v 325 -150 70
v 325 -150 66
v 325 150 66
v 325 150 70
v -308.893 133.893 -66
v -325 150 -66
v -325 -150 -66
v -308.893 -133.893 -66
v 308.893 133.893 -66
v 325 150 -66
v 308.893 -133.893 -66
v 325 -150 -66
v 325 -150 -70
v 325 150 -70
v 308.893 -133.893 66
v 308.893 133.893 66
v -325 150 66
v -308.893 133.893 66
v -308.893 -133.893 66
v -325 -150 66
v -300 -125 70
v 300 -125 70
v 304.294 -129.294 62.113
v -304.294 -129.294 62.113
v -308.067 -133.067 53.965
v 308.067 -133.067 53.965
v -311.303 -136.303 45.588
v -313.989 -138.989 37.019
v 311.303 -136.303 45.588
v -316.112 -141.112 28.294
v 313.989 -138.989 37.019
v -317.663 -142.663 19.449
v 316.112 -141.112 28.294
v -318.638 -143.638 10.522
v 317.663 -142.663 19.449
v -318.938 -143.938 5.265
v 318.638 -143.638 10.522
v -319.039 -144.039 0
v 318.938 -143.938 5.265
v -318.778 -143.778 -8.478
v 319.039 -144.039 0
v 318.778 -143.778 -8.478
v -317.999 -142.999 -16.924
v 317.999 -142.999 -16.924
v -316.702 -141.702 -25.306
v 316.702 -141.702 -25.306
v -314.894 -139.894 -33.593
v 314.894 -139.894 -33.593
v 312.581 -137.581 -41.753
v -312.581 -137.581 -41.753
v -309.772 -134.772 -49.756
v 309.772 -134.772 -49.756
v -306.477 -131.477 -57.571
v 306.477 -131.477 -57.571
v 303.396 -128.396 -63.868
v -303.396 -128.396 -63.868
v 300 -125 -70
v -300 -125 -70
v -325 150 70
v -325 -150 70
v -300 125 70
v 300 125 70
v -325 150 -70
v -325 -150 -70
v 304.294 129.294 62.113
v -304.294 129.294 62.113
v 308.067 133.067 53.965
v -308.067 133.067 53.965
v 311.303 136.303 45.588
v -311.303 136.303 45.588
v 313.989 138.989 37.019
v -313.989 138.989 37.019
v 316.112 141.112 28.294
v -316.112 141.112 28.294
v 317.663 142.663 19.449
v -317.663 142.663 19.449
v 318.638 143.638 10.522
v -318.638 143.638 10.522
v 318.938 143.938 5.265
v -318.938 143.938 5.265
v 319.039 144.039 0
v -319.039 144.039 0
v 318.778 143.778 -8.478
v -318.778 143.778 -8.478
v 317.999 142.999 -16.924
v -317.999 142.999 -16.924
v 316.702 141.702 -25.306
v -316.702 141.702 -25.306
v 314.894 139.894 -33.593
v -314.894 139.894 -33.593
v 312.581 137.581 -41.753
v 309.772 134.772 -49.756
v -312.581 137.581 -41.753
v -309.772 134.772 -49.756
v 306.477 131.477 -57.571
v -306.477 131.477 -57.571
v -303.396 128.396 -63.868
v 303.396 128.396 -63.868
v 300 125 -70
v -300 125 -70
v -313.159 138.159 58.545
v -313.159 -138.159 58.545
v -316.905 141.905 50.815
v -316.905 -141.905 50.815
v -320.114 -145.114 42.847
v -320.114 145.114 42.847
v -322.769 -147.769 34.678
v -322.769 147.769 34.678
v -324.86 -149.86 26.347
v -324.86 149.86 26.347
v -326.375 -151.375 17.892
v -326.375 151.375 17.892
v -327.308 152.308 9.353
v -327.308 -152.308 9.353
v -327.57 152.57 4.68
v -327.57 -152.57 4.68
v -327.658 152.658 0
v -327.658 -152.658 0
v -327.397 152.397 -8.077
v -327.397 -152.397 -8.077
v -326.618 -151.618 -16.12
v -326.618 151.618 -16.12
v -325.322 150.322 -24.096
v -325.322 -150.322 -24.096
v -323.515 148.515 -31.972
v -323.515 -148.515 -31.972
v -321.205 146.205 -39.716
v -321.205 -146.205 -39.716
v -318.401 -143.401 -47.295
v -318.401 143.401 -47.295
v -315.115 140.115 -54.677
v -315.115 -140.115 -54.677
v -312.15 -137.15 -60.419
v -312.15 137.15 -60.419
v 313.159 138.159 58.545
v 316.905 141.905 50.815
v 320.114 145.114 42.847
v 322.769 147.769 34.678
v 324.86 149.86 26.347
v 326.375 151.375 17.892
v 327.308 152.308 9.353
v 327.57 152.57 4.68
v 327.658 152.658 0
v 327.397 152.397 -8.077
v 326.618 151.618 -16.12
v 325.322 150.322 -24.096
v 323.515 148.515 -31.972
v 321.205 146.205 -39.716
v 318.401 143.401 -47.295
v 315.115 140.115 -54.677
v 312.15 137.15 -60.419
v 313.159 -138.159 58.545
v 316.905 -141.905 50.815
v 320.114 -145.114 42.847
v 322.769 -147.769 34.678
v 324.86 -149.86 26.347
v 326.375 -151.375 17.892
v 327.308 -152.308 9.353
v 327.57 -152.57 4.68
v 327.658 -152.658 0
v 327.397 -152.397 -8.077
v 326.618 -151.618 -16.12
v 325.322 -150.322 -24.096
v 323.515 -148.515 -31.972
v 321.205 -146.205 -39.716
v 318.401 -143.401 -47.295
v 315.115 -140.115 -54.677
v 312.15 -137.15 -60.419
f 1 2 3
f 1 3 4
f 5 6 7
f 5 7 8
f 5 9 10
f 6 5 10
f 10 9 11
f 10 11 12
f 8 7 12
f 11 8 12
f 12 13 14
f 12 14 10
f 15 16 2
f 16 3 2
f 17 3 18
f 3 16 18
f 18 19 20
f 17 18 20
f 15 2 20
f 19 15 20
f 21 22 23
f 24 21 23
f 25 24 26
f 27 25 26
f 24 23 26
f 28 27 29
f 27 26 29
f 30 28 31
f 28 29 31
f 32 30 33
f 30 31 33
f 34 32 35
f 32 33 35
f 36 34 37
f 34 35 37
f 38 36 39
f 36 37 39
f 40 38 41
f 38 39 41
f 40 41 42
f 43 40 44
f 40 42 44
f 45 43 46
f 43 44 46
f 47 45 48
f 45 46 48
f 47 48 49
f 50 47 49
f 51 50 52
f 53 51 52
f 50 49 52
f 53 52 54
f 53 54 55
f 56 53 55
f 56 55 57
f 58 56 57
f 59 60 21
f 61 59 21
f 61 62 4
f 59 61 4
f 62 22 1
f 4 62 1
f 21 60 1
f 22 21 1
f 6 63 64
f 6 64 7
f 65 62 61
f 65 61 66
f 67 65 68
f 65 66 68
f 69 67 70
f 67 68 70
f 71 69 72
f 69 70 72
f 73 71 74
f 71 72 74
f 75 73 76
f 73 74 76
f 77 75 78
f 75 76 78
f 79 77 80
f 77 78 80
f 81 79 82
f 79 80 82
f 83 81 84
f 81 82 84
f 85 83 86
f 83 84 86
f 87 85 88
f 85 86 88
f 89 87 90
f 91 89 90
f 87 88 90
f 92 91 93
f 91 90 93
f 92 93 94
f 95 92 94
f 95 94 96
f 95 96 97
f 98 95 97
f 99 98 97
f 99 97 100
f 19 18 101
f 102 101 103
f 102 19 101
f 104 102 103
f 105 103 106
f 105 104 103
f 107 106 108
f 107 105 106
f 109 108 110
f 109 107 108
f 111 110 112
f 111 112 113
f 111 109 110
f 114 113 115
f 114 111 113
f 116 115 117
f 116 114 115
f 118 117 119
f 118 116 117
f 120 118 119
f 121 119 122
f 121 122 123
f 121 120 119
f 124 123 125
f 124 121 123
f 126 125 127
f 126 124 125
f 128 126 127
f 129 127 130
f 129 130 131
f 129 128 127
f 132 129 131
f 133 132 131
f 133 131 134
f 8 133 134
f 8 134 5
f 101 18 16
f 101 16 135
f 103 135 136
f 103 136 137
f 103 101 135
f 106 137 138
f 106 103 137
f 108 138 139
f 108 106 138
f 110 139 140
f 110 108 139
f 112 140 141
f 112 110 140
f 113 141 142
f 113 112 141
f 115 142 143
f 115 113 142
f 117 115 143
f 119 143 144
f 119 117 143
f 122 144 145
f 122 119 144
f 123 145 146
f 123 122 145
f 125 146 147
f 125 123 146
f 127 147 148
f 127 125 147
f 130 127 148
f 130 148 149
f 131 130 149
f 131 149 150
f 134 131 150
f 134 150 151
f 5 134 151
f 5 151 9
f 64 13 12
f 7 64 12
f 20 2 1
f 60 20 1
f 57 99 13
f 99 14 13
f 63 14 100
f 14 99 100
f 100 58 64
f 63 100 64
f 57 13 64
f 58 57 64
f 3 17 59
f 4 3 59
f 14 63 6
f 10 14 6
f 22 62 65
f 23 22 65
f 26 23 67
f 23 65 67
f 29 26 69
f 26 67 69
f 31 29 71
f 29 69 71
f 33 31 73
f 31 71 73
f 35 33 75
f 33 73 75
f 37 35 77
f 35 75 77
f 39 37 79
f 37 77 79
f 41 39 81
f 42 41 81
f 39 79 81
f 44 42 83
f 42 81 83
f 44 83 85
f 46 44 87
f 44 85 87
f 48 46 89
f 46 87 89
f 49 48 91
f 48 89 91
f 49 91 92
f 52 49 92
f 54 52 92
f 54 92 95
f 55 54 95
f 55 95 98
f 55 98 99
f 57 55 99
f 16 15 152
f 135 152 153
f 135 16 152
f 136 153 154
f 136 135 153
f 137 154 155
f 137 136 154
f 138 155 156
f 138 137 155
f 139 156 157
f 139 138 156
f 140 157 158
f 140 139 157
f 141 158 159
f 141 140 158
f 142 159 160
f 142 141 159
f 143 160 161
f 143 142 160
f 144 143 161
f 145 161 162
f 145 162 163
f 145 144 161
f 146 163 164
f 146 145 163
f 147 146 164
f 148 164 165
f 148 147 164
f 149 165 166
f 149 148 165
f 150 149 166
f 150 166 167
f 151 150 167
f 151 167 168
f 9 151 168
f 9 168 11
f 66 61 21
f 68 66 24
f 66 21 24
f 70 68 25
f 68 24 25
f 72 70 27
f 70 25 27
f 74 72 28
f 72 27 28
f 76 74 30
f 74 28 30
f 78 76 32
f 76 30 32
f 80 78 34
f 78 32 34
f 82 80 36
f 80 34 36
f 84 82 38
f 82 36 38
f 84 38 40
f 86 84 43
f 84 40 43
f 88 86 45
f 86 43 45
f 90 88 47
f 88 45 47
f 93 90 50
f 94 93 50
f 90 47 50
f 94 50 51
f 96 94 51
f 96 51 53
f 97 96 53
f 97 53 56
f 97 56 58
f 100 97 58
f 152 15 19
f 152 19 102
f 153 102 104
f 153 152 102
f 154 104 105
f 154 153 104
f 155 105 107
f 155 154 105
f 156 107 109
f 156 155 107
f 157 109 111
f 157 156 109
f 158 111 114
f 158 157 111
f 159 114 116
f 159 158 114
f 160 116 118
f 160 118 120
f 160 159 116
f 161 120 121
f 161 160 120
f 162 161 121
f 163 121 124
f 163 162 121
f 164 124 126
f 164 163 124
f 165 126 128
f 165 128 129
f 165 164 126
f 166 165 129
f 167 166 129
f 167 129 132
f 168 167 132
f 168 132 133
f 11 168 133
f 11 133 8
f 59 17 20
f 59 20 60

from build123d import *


with BuildPart() as f2:
    # F2: sweep along a path in F0
    with BuildLine(Plane.XY) as f2_path:
        Line((-325, 150), (-325, -150))
        Line((-325, -150), (325, -150))
        Line((325, -150), (325, 150))
        Line((325, 150), (-325, 150))
    # F1 (on Right) → F2 (sweep)
    with BuildSketch(Plane.YZ):
        with BuildLine():
            Line((125, -70), (131.3123023267, -70))
            Line((131.3123023267, -70), (150, -70))
            Line((150, -70), (150, -66))
            Line((150, -66), (133.8930228842, -66))
            ThreePointArc((133.8930228842, -66), (152.6576287858, 0), (133.8930228842, 66))
            Line((133.8930228842, 66), (150, 66))
            Line((150, 66), (150, 70))
            Line((150, 70), (131.3123023267, 70))
            Line((131.3123023267, 70), (125, 70))
            ThreePointArc((125, 70), (144.0386823701, 0), (125, -70))
        make_face()
    sweep(path=f2_path.line, transition=Transition.RIGHT)


solid = f2.part
